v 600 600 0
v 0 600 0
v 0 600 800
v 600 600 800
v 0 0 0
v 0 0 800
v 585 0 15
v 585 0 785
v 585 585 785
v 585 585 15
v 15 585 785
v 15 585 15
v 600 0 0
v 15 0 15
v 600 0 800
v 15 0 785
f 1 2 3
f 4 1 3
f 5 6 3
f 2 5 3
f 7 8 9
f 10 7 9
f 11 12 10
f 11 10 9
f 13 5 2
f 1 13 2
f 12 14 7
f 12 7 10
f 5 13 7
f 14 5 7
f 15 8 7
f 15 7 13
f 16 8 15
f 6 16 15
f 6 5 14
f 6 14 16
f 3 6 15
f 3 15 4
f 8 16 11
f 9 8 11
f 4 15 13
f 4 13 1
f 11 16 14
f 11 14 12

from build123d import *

# Parameters (mm, degrees)
F0_W     = 600
F0_H     = 800
F1_DEPTH = 600
F2_T     = -15


with BuildPart() as f1:
    # F0 (on Right) → F1 (new body)
    with BuildSketch(Plane.YZ):
        with Locations((300, 400)):
            Rectangle(F0_W, F0_H)
    extrude(amount=F1_DEPTH)

    # F2
    f2_openings = [f1.faces().sort_by_distance(p)[0] for p in [
        (300, 0, 400),
    ]]
    offset(amount=F2_T, openings=f2_openings)


with BuildPart() as f3_1:
    # F3: copy of F1
    add(f1.part.moved(Location((700, 0, 0))))


solid = f1.part
